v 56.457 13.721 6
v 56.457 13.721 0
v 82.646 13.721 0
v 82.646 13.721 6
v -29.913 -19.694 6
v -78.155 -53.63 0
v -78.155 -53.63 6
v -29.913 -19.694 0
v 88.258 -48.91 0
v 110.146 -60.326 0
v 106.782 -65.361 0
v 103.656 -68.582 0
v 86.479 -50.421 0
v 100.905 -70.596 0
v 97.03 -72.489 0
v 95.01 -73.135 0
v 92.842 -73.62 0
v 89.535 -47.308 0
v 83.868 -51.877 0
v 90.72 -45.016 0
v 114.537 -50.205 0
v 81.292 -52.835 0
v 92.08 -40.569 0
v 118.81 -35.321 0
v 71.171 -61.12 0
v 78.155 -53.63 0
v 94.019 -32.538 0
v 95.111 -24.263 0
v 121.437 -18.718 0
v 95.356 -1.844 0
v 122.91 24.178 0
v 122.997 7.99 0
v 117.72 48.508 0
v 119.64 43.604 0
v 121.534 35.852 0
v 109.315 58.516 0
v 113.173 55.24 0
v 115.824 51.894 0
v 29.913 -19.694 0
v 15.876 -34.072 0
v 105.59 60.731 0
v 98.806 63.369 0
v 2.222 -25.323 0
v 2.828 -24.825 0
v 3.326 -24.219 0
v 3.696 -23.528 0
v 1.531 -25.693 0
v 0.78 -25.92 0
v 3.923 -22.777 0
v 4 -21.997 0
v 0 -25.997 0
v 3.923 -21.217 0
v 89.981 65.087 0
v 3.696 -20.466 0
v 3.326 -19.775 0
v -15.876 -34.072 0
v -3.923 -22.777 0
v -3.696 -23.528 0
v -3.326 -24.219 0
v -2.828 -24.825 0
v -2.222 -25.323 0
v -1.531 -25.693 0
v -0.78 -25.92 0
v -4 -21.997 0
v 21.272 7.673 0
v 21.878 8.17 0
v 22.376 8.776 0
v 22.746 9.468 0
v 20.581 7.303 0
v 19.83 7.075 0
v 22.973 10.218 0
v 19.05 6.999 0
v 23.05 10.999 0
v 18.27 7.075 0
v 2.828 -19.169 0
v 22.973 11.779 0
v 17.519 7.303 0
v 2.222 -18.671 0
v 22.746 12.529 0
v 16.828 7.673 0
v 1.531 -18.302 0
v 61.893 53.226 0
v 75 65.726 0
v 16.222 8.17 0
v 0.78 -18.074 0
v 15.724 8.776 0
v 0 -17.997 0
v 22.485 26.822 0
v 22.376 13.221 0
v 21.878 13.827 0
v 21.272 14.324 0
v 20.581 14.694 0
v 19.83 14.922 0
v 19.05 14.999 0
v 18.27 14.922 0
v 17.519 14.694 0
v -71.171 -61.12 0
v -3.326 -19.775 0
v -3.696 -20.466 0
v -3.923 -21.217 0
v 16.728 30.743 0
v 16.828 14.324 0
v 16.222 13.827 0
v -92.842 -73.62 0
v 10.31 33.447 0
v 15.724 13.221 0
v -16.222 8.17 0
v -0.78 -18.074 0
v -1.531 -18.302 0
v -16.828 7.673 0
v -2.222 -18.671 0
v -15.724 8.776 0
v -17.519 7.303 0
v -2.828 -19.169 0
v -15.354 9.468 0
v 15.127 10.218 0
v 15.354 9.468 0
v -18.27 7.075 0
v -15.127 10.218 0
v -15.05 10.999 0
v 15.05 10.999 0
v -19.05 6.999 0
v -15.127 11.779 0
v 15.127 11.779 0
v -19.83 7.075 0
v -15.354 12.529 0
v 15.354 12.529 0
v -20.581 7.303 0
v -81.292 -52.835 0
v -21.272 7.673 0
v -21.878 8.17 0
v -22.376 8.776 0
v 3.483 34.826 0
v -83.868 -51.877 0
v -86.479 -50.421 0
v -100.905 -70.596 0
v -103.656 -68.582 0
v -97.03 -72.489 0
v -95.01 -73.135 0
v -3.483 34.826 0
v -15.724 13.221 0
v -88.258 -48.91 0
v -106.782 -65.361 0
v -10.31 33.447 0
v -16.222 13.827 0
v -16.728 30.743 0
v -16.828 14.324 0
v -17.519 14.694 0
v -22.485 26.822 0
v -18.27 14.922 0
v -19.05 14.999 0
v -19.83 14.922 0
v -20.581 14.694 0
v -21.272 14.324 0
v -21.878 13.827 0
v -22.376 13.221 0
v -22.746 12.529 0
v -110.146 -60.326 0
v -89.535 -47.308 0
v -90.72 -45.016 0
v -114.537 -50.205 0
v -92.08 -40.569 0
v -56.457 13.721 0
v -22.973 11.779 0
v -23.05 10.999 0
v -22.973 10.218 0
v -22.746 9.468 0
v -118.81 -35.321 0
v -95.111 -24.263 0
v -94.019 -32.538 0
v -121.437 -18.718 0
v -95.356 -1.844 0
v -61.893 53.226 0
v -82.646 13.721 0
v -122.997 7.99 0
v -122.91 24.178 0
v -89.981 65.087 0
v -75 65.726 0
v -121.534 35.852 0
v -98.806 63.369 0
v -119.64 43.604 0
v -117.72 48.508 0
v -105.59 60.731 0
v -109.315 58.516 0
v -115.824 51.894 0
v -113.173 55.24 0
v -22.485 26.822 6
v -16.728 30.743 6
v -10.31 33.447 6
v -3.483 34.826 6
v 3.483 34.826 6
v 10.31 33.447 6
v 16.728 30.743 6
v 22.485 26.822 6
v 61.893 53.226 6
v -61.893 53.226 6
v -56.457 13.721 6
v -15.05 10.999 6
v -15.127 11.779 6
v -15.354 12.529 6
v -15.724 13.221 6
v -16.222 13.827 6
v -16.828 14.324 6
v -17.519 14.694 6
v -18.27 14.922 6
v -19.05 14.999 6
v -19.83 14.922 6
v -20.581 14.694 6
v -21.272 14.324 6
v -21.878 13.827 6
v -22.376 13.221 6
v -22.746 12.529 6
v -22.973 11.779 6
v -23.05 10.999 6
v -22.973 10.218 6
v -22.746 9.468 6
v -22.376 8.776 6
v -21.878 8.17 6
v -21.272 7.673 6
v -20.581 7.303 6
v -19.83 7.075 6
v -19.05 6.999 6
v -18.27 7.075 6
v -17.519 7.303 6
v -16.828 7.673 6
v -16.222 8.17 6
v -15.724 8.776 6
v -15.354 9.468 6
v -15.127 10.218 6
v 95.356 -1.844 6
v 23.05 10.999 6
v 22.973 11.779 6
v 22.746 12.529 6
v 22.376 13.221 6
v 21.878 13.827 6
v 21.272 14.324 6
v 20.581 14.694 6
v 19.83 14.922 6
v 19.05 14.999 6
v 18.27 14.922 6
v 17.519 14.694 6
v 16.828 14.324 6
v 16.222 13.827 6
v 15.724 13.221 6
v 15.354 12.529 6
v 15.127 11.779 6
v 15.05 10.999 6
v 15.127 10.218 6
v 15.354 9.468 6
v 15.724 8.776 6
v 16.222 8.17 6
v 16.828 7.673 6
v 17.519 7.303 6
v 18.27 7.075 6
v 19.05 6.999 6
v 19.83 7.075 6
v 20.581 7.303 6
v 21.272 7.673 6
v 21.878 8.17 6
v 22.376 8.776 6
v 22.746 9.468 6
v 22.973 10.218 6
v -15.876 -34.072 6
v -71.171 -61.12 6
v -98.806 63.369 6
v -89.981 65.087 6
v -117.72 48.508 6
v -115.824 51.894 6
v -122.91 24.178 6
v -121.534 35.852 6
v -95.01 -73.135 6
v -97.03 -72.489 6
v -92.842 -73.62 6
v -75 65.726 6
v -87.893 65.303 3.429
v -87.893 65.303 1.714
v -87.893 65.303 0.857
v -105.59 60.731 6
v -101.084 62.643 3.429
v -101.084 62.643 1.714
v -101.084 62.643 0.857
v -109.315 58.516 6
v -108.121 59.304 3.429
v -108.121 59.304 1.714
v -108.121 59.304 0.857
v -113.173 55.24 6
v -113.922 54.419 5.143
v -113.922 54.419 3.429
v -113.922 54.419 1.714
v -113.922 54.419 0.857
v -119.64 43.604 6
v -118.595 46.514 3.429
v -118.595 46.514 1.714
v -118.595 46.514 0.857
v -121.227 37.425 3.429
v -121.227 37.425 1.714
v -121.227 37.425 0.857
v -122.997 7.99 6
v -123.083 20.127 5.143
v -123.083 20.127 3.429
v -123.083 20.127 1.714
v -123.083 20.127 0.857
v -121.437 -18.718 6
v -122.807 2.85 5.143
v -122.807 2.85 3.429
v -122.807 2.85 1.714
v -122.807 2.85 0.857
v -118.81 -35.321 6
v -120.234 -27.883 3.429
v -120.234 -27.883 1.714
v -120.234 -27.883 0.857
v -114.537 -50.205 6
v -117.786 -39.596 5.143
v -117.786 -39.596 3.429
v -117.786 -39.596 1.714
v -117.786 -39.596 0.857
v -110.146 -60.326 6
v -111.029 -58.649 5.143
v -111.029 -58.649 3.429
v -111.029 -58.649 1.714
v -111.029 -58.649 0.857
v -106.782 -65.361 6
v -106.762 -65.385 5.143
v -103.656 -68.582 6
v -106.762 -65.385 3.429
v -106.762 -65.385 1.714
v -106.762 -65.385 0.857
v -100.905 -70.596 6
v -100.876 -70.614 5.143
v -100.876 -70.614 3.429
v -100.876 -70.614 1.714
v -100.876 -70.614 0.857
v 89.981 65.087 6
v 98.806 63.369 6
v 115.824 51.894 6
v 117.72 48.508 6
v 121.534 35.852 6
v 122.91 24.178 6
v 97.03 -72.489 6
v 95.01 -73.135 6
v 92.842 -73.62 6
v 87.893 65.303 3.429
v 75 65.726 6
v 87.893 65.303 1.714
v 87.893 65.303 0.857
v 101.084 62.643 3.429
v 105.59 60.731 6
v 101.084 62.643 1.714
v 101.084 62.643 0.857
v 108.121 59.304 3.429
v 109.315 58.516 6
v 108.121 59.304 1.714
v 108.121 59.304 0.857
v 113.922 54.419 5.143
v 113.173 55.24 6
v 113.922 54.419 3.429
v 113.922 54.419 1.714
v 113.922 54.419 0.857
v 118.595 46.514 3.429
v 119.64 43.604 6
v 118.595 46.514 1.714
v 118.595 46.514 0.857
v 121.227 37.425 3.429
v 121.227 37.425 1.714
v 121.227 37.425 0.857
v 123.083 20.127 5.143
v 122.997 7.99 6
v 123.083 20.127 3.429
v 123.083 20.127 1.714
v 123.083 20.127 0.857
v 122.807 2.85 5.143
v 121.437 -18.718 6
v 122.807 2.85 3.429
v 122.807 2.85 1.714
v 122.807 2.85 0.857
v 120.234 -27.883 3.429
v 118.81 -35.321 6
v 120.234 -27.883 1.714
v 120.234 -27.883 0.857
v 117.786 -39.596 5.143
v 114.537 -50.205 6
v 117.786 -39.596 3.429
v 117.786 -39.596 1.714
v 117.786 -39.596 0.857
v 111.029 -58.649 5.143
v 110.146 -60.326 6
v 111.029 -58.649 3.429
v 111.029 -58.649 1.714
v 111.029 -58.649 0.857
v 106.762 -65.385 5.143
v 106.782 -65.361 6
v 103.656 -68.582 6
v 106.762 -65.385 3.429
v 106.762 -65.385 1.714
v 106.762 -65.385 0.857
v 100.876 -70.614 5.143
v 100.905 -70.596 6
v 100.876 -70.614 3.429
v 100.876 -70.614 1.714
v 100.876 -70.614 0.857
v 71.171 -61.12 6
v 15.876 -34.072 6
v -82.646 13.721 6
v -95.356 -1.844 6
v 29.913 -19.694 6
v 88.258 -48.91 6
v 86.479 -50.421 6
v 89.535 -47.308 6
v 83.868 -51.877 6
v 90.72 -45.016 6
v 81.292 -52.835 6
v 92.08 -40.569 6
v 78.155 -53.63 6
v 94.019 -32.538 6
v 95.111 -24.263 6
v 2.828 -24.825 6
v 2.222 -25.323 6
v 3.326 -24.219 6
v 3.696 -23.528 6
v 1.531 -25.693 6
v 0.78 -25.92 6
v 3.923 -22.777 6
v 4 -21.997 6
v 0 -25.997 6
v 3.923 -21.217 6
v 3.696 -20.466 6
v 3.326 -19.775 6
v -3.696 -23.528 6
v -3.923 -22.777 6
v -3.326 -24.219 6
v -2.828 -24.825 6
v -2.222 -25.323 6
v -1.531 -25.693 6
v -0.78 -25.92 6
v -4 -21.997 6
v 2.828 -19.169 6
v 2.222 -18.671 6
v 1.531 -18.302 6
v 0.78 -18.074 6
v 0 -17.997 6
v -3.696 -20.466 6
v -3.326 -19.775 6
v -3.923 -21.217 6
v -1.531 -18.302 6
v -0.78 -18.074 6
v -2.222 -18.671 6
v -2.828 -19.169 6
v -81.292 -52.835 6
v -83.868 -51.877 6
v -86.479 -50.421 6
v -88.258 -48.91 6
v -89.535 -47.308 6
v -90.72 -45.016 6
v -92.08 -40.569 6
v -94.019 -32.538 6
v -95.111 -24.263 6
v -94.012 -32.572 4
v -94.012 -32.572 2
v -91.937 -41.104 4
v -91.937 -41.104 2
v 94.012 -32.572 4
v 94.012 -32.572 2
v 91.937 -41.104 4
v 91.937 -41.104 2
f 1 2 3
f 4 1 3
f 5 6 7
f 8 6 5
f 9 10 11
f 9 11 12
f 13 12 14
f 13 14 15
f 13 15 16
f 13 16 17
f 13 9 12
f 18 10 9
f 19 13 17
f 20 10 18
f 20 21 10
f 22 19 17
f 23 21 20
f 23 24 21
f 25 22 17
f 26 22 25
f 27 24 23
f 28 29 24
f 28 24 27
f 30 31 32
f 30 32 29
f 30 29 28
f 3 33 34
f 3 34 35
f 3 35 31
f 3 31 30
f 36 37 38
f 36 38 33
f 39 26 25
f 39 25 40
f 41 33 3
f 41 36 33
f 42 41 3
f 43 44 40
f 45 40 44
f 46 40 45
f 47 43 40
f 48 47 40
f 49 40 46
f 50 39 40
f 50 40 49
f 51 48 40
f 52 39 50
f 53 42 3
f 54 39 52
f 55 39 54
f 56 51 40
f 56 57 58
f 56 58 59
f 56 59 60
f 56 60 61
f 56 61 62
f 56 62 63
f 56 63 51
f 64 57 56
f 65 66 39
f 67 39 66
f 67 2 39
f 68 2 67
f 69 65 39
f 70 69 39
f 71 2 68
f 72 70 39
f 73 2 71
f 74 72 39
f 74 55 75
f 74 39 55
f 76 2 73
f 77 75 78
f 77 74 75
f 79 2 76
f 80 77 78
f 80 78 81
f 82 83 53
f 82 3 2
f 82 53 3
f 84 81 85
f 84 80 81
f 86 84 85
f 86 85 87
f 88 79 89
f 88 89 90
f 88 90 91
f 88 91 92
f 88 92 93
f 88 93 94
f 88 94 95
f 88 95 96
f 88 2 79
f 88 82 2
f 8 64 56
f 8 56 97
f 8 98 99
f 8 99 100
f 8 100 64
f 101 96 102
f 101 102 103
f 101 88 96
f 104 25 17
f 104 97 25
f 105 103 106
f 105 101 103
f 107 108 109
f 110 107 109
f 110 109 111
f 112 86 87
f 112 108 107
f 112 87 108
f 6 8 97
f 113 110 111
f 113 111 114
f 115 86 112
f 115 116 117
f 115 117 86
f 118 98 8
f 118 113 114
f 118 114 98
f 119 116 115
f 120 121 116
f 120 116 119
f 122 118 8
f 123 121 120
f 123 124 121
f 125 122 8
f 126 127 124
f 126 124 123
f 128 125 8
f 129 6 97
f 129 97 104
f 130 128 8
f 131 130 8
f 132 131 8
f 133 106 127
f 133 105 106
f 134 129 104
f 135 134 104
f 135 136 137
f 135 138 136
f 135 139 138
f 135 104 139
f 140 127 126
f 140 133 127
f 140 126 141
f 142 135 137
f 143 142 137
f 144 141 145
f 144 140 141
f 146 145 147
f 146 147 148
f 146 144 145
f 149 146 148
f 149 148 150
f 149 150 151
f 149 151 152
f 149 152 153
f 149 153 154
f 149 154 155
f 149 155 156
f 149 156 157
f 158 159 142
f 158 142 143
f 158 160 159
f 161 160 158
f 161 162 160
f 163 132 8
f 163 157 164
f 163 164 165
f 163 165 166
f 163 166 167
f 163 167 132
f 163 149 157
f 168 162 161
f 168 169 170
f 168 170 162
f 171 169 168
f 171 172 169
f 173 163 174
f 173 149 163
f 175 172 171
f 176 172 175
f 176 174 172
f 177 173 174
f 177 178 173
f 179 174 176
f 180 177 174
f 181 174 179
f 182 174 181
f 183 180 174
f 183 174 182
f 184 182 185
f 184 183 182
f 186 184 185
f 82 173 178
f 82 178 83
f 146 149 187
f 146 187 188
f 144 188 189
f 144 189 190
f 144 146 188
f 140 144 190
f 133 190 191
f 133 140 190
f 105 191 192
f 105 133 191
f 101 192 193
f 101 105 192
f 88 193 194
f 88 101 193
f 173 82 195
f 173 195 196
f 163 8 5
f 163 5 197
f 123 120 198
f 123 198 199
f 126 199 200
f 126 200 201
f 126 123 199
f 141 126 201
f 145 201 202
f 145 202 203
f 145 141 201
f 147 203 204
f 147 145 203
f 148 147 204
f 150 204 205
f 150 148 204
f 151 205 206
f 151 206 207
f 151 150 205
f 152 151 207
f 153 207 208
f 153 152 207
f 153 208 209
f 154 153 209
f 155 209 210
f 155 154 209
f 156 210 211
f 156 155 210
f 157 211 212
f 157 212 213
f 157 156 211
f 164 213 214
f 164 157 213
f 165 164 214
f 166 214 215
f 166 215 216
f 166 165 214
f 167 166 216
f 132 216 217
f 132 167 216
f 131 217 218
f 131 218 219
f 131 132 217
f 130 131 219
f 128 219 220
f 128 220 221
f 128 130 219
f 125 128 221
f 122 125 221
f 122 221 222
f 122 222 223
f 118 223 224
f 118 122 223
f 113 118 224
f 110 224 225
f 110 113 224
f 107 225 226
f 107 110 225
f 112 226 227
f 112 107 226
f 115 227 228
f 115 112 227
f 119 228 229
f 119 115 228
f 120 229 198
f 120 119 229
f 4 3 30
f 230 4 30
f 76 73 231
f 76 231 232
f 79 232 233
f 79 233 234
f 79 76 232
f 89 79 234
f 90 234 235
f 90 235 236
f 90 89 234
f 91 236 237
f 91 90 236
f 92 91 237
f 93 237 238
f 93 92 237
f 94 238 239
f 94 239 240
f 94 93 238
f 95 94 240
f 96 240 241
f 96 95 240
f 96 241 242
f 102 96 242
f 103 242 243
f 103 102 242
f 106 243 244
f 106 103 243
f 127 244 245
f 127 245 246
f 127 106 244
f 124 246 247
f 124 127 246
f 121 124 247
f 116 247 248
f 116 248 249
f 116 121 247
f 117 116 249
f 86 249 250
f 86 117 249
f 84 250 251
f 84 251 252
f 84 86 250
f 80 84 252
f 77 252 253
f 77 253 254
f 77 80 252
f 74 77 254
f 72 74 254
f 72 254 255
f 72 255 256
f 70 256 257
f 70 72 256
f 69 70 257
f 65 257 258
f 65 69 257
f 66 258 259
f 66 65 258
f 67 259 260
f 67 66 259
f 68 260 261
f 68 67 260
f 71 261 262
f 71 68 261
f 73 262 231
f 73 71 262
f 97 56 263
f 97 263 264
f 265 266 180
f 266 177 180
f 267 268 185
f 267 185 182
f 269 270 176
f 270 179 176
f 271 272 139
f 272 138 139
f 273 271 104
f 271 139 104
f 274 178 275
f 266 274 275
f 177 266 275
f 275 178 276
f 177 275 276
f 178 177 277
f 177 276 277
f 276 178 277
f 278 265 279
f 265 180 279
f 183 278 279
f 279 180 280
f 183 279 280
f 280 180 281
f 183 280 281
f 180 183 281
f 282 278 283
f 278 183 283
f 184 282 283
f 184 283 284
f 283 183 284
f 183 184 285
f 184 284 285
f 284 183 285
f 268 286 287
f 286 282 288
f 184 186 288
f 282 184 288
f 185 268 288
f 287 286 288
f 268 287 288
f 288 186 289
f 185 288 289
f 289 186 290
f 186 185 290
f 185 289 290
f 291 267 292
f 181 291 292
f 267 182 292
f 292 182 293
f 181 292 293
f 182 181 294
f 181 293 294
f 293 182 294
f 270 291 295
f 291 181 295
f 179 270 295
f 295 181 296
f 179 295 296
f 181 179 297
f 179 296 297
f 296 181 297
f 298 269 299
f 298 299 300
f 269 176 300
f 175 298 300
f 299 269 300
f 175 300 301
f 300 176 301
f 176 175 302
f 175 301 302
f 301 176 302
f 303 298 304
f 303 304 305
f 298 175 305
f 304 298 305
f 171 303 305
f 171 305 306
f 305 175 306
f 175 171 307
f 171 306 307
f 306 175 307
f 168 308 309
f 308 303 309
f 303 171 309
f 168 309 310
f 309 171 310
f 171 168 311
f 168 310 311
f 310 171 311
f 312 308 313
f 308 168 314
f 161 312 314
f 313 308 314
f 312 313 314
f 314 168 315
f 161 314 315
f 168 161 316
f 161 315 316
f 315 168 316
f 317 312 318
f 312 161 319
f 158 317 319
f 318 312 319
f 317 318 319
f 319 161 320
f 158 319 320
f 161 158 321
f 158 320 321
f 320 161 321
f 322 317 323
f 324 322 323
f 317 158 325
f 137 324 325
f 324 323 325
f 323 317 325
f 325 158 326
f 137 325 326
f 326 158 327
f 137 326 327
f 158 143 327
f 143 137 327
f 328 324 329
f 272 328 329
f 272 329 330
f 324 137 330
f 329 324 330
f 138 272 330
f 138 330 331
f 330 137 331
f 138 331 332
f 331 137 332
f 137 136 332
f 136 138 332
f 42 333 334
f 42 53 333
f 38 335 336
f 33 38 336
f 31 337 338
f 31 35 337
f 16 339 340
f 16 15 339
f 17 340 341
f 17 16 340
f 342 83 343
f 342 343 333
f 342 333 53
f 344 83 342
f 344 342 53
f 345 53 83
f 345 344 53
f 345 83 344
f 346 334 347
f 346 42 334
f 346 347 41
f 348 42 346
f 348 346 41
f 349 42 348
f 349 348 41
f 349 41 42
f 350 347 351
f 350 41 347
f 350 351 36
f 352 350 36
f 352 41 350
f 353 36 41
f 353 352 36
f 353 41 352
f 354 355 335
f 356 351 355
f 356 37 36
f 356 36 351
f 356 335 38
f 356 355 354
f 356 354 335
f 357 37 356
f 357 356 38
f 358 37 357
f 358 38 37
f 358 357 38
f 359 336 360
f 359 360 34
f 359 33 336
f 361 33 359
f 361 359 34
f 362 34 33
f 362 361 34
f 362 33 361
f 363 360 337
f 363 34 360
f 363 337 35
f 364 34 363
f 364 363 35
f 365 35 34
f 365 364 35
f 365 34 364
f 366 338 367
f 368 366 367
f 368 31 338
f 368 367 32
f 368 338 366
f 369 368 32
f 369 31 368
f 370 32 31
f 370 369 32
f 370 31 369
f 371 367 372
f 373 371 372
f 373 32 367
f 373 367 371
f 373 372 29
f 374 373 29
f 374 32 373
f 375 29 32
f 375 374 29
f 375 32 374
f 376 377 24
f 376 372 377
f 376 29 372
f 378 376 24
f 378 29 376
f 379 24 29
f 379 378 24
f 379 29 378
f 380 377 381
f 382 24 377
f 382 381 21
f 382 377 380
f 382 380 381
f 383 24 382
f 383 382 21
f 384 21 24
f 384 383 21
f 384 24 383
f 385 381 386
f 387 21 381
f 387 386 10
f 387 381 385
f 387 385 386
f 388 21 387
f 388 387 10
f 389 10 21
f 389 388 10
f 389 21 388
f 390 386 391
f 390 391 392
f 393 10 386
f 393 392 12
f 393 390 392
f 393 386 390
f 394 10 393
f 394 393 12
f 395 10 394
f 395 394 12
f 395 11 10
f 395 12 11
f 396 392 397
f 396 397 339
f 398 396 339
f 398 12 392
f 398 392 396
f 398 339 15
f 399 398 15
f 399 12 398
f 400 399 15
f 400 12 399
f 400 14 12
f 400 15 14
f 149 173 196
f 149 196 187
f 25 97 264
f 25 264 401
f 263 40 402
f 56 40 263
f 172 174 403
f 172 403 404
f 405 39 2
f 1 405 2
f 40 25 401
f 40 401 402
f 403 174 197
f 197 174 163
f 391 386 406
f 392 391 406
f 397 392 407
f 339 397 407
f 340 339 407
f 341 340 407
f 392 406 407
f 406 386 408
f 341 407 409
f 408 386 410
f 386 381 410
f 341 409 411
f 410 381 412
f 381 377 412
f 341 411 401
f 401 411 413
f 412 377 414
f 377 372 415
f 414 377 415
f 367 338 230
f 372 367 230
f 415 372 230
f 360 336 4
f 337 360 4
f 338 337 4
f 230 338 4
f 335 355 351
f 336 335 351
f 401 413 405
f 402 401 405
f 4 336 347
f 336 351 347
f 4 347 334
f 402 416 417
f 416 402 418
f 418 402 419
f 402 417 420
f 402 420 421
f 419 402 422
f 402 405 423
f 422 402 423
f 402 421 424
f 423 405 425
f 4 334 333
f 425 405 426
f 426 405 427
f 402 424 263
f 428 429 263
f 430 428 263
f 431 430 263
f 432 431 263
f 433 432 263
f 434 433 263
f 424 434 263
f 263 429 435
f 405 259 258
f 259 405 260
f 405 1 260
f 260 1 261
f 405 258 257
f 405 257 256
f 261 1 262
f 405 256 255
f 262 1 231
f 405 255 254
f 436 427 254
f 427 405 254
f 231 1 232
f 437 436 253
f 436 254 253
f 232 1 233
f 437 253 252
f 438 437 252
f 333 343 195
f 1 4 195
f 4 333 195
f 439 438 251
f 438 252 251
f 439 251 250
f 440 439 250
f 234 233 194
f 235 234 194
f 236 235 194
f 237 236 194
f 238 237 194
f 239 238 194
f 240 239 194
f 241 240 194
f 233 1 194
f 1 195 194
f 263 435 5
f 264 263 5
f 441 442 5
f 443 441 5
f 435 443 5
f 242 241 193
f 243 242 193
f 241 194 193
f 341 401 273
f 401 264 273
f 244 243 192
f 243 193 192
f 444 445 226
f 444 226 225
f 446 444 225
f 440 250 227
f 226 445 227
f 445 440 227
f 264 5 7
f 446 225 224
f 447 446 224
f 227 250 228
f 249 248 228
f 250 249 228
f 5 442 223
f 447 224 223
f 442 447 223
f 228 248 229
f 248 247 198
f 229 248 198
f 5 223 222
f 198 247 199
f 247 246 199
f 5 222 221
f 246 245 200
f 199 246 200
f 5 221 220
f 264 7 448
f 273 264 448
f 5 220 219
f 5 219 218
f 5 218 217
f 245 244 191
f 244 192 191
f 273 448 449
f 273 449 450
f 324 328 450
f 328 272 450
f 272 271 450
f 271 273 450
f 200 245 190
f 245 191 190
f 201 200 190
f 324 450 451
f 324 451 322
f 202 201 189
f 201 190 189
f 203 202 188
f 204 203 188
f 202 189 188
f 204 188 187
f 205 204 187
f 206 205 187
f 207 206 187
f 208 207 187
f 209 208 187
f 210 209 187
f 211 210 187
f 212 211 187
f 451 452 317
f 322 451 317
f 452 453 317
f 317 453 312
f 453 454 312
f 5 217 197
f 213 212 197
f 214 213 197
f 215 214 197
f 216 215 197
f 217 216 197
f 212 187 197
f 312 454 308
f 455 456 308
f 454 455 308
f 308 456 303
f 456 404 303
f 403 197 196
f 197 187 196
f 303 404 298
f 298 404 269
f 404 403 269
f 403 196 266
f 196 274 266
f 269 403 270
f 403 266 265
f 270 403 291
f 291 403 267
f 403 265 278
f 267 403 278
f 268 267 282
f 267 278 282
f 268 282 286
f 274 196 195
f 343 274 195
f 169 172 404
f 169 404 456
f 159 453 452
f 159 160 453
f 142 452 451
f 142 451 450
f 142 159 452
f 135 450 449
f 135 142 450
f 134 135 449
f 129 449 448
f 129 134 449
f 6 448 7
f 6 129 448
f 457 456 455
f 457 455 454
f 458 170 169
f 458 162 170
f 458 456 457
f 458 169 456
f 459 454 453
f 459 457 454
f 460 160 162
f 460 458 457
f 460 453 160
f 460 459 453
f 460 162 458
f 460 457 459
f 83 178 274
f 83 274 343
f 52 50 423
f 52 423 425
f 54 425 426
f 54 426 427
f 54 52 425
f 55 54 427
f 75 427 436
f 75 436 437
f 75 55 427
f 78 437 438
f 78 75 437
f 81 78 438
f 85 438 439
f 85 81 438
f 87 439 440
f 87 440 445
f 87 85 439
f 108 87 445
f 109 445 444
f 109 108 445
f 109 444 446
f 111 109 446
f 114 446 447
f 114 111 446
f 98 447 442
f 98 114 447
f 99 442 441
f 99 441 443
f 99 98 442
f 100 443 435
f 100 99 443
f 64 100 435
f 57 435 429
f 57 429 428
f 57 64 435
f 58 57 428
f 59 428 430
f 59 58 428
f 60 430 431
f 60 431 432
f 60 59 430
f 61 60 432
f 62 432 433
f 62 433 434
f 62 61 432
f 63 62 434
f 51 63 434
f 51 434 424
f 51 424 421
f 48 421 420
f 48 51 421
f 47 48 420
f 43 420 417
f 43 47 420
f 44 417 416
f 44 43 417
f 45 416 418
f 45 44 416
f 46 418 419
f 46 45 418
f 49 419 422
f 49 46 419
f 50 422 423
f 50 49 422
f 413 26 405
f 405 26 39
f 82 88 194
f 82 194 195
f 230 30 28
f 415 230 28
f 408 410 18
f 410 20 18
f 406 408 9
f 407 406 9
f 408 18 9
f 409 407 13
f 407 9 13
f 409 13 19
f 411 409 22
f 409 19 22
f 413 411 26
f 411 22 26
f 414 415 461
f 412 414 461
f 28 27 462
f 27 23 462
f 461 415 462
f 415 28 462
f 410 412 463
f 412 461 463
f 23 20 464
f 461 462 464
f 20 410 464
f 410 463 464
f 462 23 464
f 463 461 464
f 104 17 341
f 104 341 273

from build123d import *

# Parameters (mm, degrees)
SKETCH1_R           = 4
BOSS_EXTRUDE1_DEPTH = 6


with BuildPart() as part:
    # Sketch1 → Boss-Extrude1 (new body)
    with BuildSketch(Plane.XY):
        with BuildLine():
            Line((-75, 65.725969102), (75, 65.725969102))
            add(Edge.make_bspline(
                [(75, 65.725969102), (83.108190199, 65.725969102), (98.076479253, 65.565413146), (116.227458239, 54.935103324), (123.782270508, 31.987390002), (122.97494253, 4.169272007), (121.472955637, -25.817921846), (114.363626194, -53.881635547), (105.222292521, -71.411509243), (92.841871249, -73.620070941)],
                knots=[0, 0, 0, 0, 0.144554348, 0.228464377, 0.330263898, 0.520750714, 0.69048528, 0.822627379, 1, 1, 1, 1], degree=3))
            Line((92.841871249, -73.620070941), (-92.841871249, -73.620070941))
            add(Edge.make_bspline(
                [(-75, 65.725969102), (-83.108190199, 65.725969102), (-98.076479253, 65.565413146), (-116.227458239, 54.935103324), (-123.782270508, 31.987390002), (-122.97494253, 4.169272007), (-121.472955637, -25.817921846), (-114.363626194, -53.881635547), (-105.222292521, -71.411509243), (-92.841871249, -73.620070941)],
                knots=[0, 0, 0, 0, 0.144554348, 0.228464377, 0.330263898, 0.520750714, 0.69048528, 0.822627379, 1, 1, 1, 1], degree=3))
        make_face()
        with Locations((-19.05, 10.998522628)):
            Circle(SKETCH1_R, mode=Mode.SUBTRACT)
        with Locations((19.05, 10.998522628)):
            Circle(SKETCH1_R, mode=Mode.SUBTRACT)
        with Locations((0, -21.997045256)):
            Circle(SKETCH1_R, mode=Mode.SUBTRACT)
        with BuildLine():
            Line((69.370032777, 29.977750595), (95.356248747, -1.843539004))
            add(Edge.make_bspline(
                [(95.356248747, -1.843539004), (95.557611924, -16.559131142), (95.605964494, -27.343759947), (91.309378512, -43.453128682), (89.212297718, -51.357586705), (78.15487846, -53.630135884)],
                knots=[0, 0, 0, 0, 0.501052944, 0.6781501, 1, 1, 1, 1], degree=3))
            Line((78.15487846, -53.630135884), (29.913407455, -19.693543674))
            Line((29.913407455, -19.693543674), (69.370032777, 29.977750595))
        make_face(mode=Mode.SUBTRACT)
        with BuildLine():
            Line((22.484842809, 26.822226676), (61.892875588, 53.225969102))
            Line((61.892875588, 53.225969102), (-61.892875588, 53.225969102))
            Line((-61.892875588, 53.225969102), (-22.484842809, 26.822226676))
            ThreePointArc((-22.484842809, 26.822226676), (0, 35), (22.484842809, 26.822226676))
        make_face(mode=Mode.SUBTRACT)
        Polygon((-15.875735378, -34.071838731), (-71.170535031, -61.120070941), (71.170535031, -61.120070941), (15.875735378, -34.071838731), align=None, mode=Mode.SUBTRACT)
        with BuildLine():
            add(Edge.make_bspline(
                [(-95.356248747, -1.843539004), (-95.557611924, -16.559131142), (-95.605964494, -27.343759947), (-91.309378512, -43.453128682), (-89.212297718, -51.357586705), (-78.15487846, -53.630135884)],
                knots=[0, 0, 0, 0, 0.501052944, 0.6781501, 1, 1, 1, 1], degree=3))
            Line((-78.15487846, -53.630135884), (-29.913407455, -19.693543674))
            Line((-29.913407455, -19.693543674), (-69.370032777, 29.977750595))
            Line((-69.370032777, 29.977750595), (-95.356248747, -1.843539004))
        make_face(mode=Mode.SUBTRACT)
        Polygon((-56.456677111, 13.721340321), (-69.370032777, 29.977750595), (-82.64550318, 13.721340321), align=None)
        Polygon((82.64550318, 13.721340321), (69.370032777, 29.977750595), (56.456677111, 13.721340321), align=None)
    extrude(amount=BOSS_EXTRUDE1_DEPTH)


solid = part.part
